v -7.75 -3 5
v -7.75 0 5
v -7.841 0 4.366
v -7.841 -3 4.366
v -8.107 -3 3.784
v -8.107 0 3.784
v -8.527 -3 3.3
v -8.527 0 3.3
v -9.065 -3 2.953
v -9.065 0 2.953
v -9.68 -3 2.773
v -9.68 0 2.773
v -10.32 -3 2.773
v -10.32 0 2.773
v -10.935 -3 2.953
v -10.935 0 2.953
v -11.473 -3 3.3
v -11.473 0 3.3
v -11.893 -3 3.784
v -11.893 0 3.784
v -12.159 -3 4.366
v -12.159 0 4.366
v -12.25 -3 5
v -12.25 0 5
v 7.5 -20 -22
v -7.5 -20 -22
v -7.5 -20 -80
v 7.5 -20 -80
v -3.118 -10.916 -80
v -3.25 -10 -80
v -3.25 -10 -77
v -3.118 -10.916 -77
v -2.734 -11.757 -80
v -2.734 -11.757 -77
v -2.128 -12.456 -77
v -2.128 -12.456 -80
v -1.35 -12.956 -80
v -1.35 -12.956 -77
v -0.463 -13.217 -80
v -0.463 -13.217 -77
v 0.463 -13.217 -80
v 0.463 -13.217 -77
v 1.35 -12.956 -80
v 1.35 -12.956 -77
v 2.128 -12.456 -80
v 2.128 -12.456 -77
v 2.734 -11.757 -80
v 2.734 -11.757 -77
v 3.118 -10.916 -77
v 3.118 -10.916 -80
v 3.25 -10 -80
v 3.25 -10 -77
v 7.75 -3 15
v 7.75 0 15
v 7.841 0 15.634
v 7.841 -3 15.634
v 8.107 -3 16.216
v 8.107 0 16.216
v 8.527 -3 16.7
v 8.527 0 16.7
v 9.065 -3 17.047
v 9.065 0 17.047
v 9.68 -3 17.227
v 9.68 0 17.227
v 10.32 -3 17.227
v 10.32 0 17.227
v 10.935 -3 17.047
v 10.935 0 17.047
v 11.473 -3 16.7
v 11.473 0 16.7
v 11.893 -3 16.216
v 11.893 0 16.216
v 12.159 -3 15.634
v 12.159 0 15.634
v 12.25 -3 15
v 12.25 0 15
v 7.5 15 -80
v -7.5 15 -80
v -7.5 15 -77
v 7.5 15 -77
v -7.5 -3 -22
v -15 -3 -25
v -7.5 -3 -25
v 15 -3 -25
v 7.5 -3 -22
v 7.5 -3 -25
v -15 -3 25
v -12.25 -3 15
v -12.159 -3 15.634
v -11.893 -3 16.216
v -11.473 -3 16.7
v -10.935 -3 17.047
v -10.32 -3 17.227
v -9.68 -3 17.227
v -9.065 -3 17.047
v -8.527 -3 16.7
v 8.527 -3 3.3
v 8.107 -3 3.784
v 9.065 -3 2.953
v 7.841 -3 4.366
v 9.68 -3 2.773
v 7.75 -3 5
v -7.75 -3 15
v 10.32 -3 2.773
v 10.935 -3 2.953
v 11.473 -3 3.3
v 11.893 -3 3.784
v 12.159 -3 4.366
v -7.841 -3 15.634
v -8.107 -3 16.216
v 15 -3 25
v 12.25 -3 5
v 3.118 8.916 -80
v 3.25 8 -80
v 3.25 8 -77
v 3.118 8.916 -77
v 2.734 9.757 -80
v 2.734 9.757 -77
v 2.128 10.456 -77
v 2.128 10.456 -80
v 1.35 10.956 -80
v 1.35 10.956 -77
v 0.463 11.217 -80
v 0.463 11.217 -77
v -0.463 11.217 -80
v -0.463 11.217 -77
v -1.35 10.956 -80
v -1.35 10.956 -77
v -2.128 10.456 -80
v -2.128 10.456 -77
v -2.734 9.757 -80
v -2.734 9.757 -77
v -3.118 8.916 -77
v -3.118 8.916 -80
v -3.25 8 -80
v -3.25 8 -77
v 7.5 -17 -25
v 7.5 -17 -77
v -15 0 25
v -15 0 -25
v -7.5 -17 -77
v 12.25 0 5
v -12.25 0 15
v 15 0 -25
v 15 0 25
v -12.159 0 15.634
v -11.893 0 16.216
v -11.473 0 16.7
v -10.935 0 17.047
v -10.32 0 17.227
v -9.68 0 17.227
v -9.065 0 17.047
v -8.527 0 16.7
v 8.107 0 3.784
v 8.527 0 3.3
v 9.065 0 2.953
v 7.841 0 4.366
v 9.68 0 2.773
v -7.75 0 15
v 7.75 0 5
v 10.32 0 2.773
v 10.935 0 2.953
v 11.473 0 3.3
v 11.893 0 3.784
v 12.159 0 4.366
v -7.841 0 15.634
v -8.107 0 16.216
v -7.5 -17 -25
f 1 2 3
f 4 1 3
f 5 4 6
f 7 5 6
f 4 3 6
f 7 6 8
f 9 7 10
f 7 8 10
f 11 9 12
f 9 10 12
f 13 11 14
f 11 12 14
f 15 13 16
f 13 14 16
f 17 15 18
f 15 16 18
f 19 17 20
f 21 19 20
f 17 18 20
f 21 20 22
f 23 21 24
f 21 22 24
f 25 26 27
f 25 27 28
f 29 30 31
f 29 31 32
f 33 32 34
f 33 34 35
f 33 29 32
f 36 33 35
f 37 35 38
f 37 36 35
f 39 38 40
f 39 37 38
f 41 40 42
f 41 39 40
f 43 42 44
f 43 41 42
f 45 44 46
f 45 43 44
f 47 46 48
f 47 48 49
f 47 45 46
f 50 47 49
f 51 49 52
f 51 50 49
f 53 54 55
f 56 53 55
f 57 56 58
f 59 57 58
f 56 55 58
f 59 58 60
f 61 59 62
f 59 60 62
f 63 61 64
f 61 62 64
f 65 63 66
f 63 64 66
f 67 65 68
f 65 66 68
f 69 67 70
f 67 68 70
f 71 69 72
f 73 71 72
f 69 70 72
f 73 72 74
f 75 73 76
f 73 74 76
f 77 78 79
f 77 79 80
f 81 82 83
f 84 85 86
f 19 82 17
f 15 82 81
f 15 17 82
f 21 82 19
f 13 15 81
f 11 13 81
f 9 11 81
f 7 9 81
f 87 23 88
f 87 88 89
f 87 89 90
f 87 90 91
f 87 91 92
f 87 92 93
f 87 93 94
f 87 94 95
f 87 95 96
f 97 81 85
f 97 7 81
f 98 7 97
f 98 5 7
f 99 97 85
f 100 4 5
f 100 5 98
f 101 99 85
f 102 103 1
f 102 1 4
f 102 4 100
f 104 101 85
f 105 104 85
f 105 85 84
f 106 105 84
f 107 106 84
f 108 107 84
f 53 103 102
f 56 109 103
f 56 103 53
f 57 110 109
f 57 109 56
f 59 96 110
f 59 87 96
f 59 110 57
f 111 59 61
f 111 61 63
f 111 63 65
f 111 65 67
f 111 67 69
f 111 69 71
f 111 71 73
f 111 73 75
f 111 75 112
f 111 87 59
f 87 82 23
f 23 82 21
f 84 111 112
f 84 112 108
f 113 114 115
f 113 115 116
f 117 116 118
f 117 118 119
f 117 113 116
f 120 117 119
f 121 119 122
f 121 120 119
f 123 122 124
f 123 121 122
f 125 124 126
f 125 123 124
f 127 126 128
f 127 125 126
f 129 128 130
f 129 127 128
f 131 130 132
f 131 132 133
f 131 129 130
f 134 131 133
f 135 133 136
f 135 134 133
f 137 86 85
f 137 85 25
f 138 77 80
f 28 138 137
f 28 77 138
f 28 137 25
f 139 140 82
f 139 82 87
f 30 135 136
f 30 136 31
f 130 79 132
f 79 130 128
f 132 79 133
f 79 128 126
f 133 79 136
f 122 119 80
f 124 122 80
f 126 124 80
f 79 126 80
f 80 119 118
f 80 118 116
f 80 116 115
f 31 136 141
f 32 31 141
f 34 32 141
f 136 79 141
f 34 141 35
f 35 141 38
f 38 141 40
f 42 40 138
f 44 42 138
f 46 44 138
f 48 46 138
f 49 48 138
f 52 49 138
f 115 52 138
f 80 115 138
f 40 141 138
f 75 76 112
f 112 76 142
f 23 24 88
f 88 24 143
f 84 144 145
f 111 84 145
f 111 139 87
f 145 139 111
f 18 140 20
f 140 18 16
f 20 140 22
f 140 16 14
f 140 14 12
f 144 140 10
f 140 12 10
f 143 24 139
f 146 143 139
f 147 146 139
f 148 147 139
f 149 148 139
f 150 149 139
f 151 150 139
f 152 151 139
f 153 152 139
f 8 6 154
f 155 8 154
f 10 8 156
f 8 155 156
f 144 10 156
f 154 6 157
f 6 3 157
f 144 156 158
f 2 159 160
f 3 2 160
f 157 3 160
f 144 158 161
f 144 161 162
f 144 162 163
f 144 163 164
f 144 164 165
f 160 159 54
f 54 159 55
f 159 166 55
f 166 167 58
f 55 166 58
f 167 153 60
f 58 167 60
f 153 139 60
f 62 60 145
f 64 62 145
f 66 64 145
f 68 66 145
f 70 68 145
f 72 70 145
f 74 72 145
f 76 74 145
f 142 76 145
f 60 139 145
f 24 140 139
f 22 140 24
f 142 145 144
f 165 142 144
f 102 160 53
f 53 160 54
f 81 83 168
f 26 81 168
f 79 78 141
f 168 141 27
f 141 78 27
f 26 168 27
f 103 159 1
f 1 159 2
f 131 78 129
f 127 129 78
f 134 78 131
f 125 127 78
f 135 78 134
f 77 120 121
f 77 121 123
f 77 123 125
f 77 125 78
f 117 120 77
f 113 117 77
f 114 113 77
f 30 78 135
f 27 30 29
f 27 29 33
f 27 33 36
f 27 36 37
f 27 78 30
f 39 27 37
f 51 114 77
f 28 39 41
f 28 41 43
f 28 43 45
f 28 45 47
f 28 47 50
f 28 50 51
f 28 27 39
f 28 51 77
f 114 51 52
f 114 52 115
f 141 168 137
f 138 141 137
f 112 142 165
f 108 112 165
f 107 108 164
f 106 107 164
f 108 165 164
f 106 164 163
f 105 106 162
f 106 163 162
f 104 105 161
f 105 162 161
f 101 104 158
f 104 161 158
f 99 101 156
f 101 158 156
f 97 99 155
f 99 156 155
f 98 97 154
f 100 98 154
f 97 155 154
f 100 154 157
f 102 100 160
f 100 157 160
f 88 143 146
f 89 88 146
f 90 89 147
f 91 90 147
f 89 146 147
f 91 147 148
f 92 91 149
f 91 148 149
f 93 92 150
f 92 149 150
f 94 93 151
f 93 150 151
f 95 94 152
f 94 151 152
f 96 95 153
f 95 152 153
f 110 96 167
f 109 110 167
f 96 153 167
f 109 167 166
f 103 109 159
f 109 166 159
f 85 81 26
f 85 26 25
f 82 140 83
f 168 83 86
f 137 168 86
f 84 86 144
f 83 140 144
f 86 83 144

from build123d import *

# Parameters (mm, degrees)
F0_W     = 30
F0_H     = 50
F1_DEPTH = 3
F2_W     = 15
F2_H     = 3
F3_DEPTH = 17
F4_W     = 15
F4_H     = 3
F5_DEPTH = 55
F6_W     = 15
F6_H     = 35
F7_DEPTH = 3


with BuildPart() as f1:
    # F0 (on Front) → F1 (new body)
    with BuildSketch(Plane.XZ):
        Rectangle(F0_W, F0_H)
        with BuildLine():
            ThreePointArc((-12.25, 15), (-10, 17.25), (-7.75, 15))
            Line((-7.75, 15), (-7.75, 5))
            ThreePointArc((-7.75, 5), (-10, 2.75), (-12.25, 5))
            Line((-12.25, 5), (-12.25, 15))
        make_face(mode=Mode.SUBTRACT)
        with BuildLine():
            Line((12.25, 15), (12.25, 5))
            ThreePointArc((12.25, 5), (10, 2.75), (7.75, 5))
            Line((7.75, 5), (7.75, 15))
            ThreePointArc((7.75, 15), (10, 17.25), (12.25, 15))
        make_face(mode=Mode.SUBTRACT)
    extrude(amount=F1_DEPTH)

    # F2 (on face) → F3 (join)
    with BuildSketch(Plane.XZ.offset(3)):
        with Locations((0, -23.5)):
            Rectangle(F2_W, F2_H)
    extrude(amount=F3_DEPTH)

    # F4 (on face) → F5 (join)
    with BuildSketch(Plane(origin=(0, 0, -25), x_dir=(1, 0, 0), z_dir=(0, 0, -1))):
        with Locations((0, 18.5)):
            Rectangle(F4_W, F4_H)
    extrude(amount=F5_DEPTH)

    # F6 (on face) → F7 (join)
    with BuildSketch(Plane(origin=(0, 0, -80), x_dir=(1, 0, 0), z_dir=(0, 0, -1))):
        with Locations((0, 2.5)):
            Rectangle(F6_W, F6_H)
        with BuildLine():
            ThreePointArc((-3.25, 10), (0, 13.25), (3.25, 10))
            Line((3.25, 10), (3.25, -8))
            ThreePointArc((3.25, -8), (0, -11.25), (-3.25, -8))
            Line((-3.25, -8), (-3.25, 10))
        make_face(mode=Mode.SUBTRACT)
    extrude(amount=-F7_DEPTH)


solid = f1.part
